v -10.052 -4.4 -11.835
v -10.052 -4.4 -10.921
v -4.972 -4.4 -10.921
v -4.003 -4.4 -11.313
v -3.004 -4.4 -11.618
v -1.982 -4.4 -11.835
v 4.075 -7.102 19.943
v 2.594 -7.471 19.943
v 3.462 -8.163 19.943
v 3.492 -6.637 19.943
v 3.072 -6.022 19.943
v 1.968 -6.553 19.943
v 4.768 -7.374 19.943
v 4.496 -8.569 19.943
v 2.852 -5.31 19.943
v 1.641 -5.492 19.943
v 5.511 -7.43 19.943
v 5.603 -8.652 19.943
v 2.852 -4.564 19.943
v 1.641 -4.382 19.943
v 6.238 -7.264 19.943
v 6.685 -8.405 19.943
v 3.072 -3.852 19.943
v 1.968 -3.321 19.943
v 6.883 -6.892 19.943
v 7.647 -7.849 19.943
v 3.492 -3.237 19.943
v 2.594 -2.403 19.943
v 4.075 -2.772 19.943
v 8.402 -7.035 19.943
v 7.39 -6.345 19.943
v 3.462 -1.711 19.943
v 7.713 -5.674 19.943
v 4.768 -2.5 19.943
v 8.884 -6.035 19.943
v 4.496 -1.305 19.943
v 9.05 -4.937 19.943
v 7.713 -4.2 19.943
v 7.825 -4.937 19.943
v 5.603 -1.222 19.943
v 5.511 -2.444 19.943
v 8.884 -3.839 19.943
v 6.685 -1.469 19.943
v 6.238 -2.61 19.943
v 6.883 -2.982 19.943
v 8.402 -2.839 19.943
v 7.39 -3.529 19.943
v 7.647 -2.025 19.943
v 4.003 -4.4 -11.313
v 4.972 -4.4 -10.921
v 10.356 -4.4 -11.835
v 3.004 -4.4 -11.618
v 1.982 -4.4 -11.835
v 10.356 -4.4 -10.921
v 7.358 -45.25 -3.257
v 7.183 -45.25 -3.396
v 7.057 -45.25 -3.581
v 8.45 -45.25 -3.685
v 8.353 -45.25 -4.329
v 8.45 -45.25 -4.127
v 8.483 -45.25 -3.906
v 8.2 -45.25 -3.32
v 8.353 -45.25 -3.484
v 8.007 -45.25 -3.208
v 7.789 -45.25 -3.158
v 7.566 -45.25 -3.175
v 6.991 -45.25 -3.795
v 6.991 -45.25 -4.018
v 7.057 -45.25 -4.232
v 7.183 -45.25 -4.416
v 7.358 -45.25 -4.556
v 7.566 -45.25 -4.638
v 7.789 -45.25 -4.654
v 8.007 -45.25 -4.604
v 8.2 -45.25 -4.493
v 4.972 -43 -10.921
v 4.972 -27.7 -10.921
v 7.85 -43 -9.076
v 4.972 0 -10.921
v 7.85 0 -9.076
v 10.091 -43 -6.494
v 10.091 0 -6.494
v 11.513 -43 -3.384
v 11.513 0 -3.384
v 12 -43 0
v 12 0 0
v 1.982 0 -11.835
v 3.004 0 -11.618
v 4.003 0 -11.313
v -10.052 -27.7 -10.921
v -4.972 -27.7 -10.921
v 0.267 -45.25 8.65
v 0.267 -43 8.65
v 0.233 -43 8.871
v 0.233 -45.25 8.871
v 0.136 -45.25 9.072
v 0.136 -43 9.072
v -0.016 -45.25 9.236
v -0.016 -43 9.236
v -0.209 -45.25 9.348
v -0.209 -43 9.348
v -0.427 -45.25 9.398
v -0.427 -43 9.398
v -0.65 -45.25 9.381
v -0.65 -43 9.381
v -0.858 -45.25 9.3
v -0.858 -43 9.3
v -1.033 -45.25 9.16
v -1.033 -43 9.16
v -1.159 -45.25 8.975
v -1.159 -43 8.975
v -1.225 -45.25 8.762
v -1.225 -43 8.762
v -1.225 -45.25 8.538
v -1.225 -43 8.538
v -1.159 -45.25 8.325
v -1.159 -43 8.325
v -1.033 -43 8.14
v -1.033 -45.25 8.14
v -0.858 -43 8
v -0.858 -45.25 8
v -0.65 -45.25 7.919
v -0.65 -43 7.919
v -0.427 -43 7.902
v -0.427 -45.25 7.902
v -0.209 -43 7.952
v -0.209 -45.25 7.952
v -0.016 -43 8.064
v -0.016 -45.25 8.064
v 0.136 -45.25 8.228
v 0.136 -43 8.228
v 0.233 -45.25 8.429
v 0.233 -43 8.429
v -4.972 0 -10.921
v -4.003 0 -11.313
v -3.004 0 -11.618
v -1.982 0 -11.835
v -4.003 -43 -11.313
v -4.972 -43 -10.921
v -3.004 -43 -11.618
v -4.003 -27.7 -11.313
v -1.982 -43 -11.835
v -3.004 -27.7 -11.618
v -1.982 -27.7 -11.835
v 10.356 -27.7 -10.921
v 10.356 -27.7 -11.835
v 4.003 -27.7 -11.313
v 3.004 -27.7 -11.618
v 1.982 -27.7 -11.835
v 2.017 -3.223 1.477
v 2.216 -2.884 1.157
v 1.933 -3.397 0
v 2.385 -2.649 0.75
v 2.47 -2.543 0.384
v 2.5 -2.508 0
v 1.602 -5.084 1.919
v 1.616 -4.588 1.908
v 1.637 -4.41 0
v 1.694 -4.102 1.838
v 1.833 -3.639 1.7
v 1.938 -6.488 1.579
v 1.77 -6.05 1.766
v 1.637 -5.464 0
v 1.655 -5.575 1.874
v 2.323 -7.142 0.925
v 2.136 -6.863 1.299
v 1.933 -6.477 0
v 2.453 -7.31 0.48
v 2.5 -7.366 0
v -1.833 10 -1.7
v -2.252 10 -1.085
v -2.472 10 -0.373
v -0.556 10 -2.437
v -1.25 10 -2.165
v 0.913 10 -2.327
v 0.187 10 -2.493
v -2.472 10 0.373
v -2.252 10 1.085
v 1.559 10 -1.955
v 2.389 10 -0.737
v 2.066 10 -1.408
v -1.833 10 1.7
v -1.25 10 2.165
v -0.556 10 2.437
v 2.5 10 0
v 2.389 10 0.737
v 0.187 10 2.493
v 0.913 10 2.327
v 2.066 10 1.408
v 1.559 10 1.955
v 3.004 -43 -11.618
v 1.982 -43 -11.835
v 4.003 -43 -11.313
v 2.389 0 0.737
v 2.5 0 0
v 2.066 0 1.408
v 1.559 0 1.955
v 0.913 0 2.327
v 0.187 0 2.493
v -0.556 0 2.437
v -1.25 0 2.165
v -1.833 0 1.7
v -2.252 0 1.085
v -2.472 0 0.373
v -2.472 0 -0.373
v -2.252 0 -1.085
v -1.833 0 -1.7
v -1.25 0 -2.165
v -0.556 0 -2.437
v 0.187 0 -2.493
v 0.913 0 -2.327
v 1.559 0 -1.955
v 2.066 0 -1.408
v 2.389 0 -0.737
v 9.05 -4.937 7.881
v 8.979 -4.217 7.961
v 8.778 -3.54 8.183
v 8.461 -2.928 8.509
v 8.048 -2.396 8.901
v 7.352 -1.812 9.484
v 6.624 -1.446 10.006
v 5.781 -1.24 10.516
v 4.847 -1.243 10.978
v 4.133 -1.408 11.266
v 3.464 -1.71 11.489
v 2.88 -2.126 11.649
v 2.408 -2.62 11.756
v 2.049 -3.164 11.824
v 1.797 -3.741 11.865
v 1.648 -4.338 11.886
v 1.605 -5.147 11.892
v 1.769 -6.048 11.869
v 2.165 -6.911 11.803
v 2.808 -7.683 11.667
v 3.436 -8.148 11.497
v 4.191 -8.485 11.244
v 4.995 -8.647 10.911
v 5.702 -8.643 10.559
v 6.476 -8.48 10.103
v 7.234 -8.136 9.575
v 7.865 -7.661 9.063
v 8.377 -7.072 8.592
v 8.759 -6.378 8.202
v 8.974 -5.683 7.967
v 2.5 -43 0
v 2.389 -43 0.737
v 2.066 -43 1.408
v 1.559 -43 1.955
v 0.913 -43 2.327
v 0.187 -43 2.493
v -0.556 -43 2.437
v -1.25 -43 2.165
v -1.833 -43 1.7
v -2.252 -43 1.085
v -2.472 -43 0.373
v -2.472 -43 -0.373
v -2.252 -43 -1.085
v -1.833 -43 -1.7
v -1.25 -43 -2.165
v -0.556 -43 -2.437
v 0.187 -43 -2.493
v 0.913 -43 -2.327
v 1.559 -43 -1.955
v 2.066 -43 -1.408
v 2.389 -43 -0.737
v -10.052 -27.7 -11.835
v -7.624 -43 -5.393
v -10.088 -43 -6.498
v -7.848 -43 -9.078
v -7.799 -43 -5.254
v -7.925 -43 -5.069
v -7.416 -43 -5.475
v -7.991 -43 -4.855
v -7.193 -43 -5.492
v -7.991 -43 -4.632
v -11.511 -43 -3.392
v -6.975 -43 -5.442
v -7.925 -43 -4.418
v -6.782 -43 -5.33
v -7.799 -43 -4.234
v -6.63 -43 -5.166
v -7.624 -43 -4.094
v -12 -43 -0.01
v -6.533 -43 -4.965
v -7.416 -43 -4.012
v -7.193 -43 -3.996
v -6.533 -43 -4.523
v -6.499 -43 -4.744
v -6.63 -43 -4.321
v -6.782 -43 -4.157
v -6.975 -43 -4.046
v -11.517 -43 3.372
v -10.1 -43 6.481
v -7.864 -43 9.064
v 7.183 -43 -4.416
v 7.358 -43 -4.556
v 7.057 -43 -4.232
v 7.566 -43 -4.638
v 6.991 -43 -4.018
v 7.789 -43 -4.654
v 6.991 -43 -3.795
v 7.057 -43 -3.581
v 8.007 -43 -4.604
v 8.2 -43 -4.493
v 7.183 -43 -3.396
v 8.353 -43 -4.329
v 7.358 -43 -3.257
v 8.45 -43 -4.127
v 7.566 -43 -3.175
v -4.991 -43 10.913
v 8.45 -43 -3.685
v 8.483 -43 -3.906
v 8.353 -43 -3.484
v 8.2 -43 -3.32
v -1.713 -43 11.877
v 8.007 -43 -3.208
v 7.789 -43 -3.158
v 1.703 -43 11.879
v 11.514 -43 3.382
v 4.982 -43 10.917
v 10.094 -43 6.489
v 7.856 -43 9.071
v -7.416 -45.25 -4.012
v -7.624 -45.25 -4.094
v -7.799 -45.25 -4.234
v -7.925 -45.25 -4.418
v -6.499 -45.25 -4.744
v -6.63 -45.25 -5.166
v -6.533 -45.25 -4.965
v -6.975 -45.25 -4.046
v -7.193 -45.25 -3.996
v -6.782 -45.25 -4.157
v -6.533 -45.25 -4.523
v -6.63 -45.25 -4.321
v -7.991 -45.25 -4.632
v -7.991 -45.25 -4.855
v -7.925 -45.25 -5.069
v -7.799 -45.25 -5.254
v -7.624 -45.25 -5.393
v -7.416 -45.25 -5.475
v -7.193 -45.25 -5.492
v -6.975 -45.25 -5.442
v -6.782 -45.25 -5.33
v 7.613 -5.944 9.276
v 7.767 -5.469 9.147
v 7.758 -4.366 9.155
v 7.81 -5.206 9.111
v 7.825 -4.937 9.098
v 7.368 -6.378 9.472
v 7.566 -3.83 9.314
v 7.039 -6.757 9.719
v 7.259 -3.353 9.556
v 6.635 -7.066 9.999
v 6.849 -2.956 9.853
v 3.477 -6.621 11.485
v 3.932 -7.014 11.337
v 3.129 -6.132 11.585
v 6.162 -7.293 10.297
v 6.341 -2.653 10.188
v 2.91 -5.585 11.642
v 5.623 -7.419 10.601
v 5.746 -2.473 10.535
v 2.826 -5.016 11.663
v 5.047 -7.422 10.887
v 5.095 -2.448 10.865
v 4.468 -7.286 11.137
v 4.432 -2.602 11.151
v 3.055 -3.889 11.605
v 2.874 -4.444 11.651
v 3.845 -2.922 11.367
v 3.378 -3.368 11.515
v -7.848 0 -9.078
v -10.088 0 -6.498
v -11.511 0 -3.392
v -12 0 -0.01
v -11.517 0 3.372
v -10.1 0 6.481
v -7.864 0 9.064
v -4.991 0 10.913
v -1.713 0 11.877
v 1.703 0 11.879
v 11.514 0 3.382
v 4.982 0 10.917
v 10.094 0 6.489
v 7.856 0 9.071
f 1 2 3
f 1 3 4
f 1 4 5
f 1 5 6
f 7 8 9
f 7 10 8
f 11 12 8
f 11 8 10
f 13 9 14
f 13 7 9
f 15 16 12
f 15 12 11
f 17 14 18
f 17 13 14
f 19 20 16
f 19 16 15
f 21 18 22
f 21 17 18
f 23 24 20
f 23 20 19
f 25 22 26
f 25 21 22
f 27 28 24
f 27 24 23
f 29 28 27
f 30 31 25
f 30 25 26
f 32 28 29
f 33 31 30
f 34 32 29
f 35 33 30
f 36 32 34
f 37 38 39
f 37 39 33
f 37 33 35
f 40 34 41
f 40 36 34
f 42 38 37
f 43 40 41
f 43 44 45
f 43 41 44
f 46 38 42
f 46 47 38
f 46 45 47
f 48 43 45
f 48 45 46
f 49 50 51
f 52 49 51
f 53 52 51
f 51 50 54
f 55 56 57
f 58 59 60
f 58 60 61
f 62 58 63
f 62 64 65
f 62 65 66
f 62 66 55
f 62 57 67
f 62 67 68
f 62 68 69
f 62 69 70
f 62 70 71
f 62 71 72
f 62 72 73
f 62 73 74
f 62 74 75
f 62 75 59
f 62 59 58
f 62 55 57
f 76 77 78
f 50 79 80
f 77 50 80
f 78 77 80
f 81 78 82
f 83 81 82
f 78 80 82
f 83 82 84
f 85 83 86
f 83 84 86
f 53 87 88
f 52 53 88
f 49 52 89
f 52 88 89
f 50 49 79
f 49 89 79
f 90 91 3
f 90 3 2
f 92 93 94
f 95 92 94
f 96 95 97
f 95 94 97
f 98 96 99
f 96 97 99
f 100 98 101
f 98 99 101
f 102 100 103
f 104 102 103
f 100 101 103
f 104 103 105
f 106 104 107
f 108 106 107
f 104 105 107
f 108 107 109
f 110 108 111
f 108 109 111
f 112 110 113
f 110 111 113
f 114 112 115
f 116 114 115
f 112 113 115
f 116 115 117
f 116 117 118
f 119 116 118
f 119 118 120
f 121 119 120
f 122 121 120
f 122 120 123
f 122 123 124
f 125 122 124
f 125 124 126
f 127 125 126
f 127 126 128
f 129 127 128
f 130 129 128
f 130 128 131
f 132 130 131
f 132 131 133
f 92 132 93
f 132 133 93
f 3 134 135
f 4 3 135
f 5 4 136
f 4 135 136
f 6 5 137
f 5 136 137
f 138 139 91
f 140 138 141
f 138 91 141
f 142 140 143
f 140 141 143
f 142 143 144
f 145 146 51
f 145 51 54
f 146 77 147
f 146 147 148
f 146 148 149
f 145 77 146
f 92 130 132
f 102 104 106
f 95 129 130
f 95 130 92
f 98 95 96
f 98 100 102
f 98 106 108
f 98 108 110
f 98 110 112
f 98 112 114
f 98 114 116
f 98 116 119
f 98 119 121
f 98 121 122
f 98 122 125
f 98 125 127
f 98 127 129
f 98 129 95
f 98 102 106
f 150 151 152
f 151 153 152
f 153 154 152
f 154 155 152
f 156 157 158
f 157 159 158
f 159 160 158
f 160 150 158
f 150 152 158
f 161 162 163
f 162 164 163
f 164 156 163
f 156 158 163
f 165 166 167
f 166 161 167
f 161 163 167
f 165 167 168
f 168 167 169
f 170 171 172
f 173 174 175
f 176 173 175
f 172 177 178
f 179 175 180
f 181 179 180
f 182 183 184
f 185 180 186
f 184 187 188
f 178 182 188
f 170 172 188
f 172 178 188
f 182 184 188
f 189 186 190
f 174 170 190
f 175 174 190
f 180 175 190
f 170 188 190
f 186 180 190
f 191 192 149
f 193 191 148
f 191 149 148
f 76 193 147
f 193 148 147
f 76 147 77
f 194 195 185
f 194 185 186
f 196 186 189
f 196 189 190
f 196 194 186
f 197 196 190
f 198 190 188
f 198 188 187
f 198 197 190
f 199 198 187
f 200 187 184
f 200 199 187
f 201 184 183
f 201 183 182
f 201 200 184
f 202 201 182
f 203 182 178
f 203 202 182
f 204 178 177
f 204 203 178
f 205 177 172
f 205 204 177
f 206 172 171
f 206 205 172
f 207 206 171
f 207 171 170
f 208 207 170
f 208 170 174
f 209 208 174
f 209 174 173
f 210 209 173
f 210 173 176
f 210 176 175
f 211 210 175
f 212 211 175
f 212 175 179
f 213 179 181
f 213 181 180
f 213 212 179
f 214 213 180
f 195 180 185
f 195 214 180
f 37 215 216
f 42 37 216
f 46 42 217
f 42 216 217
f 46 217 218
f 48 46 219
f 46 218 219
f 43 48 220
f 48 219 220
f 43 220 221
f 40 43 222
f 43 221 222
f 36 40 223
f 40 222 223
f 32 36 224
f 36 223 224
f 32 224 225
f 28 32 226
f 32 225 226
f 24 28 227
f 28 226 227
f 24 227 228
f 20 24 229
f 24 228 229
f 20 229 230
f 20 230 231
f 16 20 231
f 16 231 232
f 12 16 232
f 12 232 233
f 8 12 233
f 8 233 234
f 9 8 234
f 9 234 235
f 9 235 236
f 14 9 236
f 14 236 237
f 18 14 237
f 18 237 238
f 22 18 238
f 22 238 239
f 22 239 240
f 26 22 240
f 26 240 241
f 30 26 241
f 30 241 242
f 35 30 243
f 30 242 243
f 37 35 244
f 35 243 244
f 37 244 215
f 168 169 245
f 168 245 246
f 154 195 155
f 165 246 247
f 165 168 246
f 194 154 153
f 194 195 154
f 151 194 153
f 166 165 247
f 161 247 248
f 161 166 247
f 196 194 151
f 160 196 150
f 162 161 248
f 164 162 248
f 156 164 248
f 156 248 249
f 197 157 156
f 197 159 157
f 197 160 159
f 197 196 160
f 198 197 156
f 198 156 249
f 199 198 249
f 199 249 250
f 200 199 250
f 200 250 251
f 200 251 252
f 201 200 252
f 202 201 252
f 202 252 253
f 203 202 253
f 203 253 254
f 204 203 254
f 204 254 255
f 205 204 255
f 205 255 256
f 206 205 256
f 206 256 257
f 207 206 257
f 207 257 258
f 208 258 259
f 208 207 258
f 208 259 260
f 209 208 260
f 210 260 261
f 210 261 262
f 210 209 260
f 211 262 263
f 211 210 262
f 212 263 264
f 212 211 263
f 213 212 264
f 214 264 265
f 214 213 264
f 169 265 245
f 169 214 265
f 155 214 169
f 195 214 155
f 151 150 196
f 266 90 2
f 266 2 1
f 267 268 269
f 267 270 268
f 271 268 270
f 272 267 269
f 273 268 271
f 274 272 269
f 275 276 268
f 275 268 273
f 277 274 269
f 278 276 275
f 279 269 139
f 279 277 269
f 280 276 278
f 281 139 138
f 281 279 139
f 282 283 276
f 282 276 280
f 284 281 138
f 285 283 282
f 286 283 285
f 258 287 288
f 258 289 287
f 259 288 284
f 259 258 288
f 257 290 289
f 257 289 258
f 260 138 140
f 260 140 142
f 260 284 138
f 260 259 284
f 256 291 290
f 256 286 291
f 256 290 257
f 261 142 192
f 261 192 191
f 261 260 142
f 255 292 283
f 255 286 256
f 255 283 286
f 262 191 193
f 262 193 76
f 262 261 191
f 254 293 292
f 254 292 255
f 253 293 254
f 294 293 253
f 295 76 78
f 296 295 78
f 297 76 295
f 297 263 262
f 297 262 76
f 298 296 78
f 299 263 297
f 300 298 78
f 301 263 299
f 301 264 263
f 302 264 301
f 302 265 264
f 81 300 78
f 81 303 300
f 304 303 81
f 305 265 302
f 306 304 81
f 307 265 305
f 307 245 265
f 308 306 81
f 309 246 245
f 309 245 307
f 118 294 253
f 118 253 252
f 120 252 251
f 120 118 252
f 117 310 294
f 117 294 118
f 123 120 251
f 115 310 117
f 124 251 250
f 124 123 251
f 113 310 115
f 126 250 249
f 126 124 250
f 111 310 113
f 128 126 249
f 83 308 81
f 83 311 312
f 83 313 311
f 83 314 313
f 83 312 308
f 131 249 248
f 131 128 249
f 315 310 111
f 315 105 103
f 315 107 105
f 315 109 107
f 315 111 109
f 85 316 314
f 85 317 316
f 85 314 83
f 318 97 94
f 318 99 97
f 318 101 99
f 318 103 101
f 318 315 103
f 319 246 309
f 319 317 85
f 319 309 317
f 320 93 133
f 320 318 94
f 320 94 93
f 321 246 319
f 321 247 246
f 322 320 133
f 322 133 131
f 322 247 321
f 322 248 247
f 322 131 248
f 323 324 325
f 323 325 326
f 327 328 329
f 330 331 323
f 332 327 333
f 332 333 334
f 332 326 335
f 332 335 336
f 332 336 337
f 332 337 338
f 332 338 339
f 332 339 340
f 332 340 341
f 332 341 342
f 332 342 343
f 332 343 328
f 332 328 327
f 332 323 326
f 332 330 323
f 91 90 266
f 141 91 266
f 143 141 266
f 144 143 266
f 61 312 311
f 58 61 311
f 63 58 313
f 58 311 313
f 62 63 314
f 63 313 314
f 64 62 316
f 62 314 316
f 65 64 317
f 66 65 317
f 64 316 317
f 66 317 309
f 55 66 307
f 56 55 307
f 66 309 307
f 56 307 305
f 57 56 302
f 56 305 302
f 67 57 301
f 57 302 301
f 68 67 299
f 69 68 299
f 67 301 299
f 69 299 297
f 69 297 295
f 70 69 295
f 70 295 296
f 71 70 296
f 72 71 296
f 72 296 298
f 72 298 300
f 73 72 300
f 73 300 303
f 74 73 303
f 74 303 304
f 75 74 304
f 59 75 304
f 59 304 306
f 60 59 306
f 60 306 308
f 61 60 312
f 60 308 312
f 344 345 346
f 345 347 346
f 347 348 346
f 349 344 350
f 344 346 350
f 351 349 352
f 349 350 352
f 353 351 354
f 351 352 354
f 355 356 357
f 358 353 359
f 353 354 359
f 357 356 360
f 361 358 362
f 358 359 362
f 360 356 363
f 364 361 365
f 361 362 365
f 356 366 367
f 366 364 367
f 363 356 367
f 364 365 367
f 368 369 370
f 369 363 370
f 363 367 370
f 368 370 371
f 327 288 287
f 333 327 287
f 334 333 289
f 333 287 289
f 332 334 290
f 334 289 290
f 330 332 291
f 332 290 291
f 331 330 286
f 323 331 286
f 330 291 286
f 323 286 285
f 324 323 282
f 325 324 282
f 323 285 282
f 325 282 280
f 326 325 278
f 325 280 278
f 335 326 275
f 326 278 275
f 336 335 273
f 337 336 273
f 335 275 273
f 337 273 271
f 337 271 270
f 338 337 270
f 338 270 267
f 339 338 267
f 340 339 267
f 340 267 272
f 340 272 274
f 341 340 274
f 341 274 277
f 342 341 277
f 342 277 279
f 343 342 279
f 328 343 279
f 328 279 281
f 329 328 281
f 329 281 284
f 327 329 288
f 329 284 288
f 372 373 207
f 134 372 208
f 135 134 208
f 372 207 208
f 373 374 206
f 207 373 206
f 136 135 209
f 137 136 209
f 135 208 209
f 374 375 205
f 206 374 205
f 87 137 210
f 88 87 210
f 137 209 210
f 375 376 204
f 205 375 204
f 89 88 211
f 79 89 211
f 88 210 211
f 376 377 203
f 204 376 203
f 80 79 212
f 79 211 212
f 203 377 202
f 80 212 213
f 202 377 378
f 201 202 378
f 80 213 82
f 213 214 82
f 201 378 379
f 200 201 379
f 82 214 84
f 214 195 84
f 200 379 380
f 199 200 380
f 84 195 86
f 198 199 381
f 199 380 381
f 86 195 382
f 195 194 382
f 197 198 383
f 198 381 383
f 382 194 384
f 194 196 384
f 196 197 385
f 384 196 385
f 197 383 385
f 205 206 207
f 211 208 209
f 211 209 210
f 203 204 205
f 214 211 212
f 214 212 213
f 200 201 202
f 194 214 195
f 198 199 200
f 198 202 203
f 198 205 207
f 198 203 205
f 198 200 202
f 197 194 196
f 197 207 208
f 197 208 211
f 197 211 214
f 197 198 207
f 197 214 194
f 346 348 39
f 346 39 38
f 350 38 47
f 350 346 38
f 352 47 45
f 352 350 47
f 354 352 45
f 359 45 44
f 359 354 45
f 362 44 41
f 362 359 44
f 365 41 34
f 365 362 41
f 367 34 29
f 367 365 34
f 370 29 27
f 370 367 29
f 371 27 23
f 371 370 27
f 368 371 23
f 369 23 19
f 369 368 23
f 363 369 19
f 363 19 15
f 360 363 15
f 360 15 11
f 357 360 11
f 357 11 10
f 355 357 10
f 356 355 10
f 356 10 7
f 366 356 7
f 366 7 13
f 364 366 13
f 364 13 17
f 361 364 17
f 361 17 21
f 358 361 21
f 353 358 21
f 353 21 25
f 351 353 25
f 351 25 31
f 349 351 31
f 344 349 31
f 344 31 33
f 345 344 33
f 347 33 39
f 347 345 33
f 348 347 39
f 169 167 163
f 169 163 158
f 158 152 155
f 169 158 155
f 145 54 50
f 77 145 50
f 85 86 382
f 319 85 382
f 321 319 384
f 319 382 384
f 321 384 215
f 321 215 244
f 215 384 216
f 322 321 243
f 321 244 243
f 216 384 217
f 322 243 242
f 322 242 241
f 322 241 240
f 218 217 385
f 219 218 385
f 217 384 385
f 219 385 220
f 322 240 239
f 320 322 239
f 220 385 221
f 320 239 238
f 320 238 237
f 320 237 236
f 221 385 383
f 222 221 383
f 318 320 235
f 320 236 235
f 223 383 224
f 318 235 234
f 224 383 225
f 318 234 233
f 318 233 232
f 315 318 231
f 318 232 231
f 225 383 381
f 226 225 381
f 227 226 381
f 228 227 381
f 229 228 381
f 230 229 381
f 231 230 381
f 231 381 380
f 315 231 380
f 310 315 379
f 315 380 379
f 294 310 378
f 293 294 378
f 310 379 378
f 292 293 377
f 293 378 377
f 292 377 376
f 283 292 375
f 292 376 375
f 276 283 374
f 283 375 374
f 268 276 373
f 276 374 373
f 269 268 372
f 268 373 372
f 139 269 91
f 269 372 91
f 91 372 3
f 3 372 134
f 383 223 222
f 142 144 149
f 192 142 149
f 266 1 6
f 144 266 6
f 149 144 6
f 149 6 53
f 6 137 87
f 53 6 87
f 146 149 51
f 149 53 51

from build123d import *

# Parameters (mm, degrees)
F1_R     = 2.5
F2_DEPTH = 43
F3_START = 4.4
F3_DEPTH = 23.3
F4_R     = 3.725
F4_R_2   = 2.5
F5_DEPTH = 19.942721352
F6_R     = 0.75
F7_DEPTH = 2.25
F8_DEPTH = 10


with BuildPart() as f2:
    # F1 (on Front) → F2 (new body)
    with BuildSketch(Plane.XZ):
        with BuildLine():
            ThreePointArc((4.9722086055, -10.921407491), (10.0912462874, -6.4935928705), (12, 0))
            ThreePointArc((12, 0), (-6.4935928705, 10.0912462874), (-4.9722086055, -10.921407491))
            Line((-4.9722086055, -10.921407491), (4.9722086055, -10.921407491))
        make_face()
        Circle(F1_R, mode=Mode.SUBTRACT)
        with BuildLine():
            Line((4.9722086055, -10.921407491), (-4.9722086055, -10.921407491))
            ThreePointArc((-4.9722086055, -10.921407491), (-3.5069378946, -11.4761224551), (-1.9818854132, -11.8352072313))
            Line((-1.9818854132, -11.8352072313), (1.9818854132, -11.8352072313))
            ThreePointArc((1.9818854132, -11.8352072313), (3.5069378946, -11.4761224551), (4.9722086055, -10.921407491))
        make_face()
    extrude(amount=F2_DEPTH)

    # F1 (on Front) → F3 (join)
    with BuildSketch(Plane.XZ.offset(F3_START)):
        with BuildLine():
            ThreePointArc((-1.9818854132, -11.8352072313), (-3.5069378946, -11.4761224551), (-4.9722086055, -10.921407491))
            Line((-4.9722086055, -10.921407491), (-10.0521799177, -10.921407491))
            Line((-10.0521799177, -10.921407491), (-10.0521799177, -11.8352072313))
            Line((-10.0521799177, -11.8352072313), (-1.9818854132, -11.8352072313))
        make_face()
        with BuildLine():
            Line((10.3560099378, -10.921407491), (4.9722086055, -10.921407491))
            ThreePointArc((4.9722086055, -10.921407491), (3.5069378946, -11.4761224551), (1.9818854132, -11.8352072313))
            Line((1.9818854132, -11.8352072313), (10.3560099378, -11.8352072313))
            Line((10.3560099378, -11.8352072313), (10.3560099378, -10.921407491))
        make_face()
        with BuildLine():
            Line((4.9722086055, -10.921407491), (-4.9722086055, -10.921407491))
            ThreePointArc((-4.9722086055, -10.921407491), (-3.5069378946, -11.4761224551), (-1.9818854132, -11.8352072313))
            Line((-1.9818854132, -11.8352072313), (1.9818854132, -11.8352072313))
            ThreePointArc((1.9818854132, -11.8352072313), (3.5069378946, -11.4761224551), (4.9722086055, -10.921407491))
        make_face()
    extrude(amount=F3_DEPTH)

    # F4 (on Top) → F5 (join, through all)
    with BuildSketch(Plane.XY):
        with Locations((5.3245240537, -4.937)):
            Circle(F4_R)
        with Locations((5.3245240537, -4.937)):
            Circle(F4_R_2, mode=Mode.SUBTRACT)
    extrude(amount=F5_DEPTH)

    # F6 (on face) → F7 (join)
    with BuildSketch(Plane.XZ.offset(43)):
        with Locations((-0.4834350257, 8.65)):
            Circle(F6_R)
        with Locations((-7.2494022299, -4.7436670133)):
            Circle(F6_R)
        with Locations((7.7328372556, -3.9063329867)):
            Circle(F6_R)
    extrude(amount=F7_DEPTH)


with BuildPart() as f8:
    # F1 (on Front) → F8 (new body)
    with BuildSketch(Plane.XZ):
        Circle(F1_R)
    extrude(amount=-F8_DEPTH)


solid = Compound([f2.part, f8.part])
